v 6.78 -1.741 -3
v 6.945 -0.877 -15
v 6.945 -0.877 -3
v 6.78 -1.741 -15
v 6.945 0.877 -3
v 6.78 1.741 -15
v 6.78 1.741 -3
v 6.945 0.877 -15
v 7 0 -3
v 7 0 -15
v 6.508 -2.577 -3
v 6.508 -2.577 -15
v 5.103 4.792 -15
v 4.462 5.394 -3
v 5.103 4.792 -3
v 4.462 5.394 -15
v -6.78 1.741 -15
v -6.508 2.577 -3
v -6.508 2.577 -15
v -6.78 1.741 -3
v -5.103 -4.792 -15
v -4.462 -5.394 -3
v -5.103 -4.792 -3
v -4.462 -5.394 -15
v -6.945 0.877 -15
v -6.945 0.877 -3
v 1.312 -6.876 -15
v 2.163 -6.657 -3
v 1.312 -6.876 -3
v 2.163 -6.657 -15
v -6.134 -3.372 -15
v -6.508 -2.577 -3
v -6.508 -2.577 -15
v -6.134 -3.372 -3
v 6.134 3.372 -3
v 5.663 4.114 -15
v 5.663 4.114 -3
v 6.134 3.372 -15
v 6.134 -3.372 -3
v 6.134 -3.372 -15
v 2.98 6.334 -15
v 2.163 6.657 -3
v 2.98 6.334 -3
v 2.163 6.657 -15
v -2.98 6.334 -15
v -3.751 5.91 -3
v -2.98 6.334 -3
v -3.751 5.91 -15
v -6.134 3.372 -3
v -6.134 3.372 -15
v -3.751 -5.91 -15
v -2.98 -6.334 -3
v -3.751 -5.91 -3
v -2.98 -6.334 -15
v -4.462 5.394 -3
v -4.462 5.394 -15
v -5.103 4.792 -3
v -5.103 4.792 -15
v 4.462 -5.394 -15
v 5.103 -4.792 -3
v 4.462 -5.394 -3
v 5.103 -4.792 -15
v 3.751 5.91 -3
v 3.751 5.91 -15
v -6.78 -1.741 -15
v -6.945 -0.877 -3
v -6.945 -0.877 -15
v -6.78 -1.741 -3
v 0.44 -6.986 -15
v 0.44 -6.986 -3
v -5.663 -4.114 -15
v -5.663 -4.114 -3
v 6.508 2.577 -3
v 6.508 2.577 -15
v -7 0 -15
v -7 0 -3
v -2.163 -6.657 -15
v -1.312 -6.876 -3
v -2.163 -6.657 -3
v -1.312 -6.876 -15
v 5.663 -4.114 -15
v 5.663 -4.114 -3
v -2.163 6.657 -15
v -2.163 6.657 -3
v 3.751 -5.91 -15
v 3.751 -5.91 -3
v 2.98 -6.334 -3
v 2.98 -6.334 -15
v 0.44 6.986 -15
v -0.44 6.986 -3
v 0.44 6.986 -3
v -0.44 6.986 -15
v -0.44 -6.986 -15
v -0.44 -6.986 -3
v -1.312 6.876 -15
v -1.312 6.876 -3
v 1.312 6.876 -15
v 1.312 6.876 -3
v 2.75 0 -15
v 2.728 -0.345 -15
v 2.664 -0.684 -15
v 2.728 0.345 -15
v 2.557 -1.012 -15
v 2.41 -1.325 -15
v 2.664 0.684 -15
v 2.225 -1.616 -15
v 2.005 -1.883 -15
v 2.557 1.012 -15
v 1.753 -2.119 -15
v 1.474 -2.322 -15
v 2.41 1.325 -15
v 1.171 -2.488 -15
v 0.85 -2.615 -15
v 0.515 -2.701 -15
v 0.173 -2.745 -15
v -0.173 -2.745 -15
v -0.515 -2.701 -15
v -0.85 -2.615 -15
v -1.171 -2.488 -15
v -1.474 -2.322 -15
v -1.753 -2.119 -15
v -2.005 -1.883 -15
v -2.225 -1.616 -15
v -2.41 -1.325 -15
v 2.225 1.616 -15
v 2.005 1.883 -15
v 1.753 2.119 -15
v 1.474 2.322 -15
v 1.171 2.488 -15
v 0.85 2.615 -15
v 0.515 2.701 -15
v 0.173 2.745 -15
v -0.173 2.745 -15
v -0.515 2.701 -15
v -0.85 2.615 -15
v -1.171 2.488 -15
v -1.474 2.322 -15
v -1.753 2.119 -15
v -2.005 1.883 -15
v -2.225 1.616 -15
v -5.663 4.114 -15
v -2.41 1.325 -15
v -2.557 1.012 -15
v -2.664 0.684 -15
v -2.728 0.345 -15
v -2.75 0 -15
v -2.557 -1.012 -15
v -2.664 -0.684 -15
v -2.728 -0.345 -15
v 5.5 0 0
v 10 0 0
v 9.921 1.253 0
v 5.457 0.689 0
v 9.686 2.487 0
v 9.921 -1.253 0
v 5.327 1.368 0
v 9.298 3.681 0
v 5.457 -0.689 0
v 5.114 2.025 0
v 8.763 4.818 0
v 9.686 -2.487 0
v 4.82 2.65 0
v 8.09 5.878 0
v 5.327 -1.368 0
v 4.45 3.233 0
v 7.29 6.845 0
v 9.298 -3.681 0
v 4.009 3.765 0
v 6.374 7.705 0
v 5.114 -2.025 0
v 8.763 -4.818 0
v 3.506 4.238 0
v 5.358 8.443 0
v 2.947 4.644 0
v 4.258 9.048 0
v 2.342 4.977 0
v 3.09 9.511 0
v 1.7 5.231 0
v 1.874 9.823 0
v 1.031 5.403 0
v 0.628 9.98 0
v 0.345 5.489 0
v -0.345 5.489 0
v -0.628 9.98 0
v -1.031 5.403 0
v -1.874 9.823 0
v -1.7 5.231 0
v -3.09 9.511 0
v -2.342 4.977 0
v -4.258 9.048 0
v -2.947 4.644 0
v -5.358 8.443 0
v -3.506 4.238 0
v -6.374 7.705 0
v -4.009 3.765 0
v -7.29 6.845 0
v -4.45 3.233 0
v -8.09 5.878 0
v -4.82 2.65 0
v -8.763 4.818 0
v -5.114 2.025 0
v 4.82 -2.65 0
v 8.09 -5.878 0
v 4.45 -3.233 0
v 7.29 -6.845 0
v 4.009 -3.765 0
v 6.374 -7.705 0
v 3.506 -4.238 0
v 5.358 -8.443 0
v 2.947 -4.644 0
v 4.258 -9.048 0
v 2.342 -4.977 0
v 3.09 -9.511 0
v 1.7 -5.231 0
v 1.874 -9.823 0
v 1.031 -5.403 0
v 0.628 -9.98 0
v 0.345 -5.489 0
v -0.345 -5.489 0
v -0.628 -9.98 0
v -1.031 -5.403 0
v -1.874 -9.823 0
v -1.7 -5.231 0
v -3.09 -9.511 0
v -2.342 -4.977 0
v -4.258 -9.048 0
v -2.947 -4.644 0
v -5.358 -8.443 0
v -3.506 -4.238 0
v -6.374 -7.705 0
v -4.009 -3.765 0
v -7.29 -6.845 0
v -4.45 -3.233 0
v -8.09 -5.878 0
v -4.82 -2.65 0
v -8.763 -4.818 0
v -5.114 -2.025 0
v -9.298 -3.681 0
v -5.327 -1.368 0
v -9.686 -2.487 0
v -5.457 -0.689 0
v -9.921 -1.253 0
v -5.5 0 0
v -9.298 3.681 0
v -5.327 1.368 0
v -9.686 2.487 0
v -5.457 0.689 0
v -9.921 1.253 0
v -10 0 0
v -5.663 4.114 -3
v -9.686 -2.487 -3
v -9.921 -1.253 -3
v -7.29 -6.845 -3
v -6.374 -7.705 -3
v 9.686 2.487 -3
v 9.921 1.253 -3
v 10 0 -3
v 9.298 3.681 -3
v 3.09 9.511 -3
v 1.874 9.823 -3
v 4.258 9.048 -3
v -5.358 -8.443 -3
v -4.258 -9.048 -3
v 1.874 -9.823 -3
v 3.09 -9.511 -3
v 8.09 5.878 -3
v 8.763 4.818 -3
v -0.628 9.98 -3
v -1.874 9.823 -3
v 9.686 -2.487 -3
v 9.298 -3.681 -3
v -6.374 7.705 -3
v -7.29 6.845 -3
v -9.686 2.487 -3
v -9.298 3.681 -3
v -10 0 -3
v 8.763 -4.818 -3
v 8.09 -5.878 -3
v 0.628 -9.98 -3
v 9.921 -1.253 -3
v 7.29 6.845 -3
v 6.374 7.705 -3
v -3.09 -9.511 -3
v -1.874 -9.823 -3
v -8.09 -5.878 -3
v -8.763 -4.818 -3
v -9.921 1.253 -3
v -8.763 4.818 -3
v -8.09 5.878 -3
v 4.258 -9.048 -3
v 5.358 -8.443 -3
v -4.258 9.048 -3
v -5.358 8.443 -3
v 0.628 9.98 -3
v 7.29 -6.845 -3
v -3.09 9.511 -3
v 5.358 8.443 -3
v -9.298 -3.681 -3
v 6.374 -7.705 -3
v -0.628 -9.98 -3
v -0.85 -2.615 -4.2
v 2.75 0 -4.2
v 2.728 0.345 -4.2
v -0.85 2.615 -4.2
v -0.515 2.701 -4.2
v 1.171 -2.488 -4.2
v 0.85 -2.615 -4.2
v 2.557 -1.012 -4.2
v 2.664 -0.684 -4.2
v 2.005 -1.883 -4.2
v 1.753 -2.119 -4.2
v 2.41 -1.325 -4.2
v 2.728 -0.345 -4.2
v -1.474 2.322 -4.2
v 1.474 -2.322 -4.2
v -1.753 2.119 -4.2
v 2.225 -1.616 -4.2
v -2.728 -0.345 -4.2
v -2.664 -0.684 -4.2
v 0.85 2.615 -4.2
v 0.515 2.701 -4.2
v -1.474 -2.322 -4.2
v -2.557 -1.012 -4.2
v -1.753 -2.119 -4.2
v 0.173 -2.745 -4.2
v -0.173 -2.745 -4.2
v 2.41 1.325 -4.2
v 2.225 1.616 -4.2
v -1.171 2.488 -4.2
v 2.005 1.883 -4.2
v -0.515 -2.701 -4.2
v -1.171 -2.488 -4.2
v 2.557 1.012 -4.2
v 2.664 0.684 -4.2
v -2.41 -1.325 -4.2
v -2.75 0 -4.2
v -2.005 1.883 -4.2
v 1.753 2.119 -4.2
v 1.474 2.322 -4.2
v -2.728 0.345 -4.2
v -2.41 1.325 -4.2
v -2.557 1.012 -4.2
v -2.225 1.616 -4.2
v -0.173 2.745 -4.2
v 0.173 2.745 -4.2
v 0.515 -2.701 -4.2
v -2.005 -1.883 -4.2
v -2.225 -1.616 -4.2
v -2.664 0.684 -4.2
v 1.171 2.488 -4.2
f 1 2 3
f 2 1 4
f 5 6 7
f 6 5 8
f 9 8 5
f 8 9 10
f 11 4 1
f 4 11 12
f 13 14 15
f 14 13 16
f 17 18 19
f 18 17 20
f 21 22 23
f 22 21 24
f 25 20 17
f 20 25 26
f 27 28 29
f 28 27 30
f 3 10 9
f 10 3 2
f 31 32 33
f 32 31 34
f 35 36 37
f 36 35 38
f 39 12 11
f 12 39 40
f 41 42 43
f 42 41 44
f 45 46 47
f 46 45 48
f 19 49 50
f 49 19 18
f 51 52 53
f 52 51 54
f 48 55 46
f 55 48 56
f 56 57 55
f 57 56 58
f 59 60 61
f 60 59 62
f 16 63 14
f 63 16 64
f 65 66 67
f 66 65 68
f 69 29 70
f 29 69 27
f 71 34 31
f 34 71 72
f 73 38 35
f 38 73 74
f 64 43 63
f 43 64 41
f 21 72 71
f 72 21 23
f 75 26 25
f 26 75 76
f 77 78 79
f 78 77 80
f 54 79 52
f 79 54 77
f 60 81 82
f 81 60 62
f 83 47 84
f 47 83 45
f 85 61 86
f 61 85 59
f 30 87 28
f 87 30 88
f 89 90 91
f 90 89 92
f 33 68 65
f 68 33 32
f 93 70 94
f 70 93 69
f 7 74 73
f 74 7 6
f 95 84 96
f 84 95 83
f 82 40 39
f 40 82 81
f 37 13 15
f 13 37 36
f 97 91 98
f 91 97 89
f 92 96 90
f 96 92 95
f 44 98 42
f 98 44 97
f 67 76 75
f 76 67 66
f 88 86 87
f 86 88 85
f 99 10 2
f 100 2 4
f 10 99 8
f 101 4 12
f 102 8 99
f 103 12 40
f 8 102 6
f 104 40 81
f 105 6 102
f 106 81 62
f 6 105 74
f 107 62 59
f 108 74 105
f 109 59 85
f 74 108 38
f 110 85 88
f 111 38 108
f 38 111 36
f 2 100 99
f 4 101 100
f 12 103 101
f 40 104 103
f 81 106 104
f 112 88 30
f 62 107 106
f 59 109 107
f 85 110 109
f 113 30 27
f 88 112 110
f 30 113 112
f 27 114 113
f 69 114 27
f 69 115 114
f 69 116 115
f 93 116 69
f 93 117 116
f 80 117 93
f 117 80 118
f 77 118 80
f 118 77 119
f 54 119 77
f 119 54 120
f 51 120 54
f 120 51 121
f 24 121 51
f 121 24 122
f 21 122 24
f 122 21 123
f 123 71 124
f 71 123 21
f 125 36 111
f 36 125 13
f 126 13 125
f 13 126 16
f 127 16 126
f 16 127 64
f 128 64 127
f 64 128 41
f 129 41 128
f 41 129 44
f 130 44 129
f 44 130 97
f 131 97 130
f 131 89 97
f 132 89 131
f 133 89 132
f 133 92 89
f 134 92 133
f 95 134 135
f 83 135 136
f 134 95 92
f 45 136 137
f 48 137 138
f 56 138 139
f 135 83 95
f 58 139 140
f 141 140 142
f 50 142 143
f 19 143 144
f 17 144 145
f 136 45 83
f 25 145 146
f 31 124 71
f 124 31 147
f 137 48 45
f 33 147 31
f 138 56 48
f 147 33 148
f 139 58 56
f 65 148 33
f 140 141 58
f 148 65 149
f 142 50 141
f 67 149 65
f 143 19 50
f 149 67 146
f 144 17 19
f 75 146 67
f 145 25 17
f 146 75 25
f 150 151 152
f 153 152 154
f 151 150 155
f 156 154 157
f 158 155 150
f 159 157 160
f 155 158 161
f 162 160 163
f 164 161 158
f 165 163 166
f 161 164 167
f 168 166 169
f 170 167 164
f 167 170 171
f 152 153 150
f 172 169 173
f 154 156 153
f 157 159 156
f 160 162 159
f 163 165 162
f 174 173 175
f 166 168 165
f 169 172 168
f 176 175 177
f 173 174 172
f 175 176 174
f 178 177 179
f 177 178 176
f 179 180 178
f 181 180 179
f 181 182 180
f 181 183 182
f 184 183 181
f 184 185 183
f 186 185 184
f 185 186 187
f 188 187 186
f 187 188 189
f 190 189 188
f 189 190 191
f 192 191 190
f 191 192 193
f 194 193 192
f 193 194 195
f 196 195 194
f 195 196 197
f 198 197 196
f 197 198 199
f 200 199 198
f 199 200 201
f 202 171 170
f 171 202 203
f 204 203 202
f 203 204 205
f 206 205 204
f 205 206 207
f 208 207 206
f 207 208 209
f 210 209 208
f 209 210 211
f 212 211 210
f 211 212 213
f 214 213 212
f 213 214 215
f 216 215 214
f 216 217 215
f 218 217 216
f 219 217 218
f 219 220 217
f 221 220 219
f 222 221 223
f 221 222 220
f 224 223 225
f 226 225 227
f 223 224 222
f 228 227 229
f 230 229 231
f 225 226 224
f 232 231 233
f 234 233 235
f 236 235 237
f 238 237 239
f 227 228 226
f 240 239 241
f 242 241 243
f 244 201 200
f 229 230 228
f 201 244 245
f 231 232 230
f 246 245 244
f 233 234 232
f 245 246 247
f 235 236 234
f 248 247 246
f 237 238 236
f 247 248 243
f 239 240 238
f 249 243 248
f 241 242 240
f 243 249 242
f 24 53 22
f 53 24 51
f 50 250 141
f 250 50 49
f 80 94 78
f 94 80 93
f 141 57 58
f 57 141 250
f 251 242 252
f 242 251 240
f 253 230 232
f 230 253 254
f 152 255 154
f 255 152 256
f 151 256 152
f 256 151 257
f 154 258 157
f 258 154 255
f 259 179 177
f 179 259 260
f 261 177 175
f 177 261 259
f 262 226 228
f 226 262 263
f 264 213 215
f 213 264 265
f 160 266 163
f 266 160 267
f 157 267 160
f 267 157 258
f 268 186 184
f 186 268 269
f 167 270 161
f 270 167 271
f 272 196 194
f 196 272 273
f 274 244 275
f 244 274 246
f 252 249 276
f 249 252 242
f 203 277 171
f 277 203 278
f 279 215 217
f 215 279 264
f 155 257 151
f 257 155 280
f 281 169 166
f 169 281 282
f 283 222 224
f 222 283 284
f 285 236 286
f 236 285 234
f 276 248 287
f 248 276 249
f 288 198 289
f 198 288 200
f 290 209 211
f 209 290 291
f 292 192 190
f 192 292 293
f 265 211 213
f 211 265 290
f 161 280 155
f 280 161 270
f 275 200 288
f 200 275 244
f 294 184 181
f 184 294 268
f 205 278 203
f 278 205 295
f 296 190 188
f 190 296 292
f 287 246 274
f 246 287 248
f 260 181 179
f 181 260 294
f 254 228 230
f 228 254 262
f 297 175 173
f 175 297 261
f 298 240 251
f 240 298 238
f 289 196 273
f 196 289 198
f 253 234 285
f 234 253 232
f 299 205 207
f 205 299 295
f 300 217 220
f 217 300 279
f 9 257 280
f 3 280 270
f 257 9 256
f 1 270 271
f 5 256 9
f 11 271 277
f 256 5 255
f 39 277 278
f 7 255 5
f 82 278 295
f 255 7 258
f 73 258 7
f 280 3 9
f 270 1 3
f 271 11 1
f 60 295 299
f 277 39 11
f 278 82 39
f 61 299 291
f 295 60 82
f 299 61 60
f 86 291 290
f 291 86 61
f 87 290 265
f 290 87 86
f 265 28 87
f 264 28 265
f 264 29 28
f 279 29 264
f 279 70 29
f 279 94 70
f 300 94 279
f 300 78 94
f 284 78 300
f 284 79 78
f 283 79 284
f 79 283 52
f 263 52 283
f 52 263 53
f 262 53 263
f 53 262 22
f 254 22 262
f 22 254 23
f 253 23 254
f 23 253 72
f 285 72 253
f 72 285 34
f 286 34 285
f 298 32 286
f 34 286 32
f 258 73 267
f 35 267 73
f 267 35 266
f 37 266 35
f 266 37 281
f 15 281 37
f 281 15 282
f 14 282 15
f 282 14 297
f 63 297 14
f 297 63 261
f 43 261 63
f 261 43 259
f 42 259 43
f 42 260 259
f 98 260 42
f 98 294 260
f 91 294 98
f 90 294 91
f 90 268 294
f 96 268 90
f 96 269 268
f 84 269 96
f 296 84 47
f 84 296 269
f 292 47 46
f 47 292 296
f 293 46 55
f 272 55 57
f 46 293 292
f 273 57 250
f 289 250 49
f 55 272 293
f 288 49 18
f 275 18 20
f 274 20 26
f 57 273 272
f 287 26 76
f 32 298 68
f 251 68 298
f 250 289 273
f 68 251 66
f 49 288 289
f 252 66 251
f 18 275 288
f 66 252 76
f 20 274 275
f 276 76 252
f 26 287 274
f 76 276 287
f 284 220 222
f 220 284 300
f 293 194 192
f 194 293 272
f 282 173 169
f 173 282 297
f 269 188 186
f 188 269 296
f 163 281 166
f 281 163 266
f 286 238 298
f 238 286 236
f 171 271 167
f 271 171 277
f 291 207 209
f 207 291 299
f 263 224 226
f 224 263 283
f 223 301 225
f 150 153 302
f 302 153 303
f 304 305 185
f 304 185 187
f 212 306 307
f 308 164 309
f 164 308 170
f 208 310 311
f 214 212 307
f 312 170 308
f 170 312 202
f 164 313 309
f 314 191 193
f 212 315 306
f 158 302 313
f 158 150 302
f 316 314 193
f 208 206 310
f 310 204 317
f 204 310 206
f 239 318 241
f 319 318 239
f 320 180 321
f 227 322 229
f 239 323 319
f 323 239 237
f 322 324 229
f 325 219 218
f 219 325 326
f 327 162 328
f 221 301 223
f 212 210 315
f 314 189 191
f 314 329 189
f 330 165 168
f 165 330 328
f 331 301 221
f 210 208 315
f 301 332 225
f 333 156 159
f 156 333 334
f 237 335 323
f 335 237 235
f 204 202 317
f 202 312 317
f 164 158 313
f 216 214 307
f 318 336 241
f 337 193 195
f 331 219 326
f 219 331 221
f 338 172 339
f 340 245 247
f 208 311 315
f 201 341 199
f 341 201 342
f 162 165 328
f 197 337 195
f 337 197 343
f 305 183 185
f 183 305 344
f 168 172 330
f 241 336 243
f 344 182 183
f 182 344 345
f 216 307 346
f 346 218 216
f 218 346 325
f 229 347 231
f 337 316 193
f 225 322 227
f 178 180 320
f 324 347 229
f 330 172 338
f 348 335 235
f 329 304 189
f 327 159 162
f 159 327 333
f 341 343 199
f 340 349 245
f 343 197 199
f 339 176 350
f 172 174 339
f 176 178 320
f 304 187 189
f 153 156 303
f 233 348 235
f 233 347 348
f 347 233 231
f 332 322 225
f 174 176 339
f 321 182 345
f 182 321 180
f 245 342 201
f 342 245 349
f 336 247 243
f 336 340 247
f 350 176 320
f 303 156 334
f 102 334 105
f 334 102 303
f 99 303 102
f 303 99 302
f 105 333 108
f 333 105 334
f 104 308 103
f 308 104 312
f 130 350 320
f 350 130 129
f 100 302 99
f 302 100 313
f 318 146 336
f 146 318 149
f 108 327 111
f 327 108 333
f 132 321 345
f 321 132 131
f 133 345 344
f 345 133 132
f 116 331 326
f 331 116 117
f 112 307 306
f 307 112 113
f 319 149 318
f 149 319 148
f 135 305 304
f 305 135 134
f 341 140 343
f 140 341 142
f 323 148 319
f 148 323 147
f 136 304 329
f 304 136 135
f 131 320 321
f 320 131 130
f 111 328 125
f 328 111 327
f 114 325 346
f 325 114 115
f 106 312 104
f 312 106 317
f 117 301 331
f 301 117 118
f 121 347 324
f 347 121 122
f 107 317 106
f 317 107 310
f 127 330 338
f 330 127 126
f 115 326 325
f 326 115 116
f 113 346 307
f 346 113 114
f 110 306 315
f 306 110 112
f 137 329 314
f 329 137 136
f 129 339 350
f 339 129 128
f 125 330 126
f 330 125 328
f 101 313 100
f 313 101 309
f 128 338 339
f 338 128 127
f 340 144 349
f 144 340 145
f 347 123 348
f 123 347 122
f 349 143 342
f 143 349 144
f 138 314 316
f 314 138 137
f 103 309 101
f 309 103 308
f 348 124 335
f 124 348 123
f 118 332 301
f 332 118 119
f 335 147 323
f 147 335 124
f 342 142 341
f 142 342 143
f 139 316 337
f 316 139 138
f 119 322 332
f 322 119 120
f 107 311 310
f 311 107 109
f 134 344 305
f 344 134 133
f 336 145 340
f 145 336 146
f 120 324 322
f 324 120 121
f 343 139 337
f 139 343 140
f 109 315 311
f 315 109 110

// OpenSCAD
$fn = 50;


difference() {
	union() {
		translate(v = [0, 0, -15.0000000000]) {
			cylinder(h = 15, r = 7.0000000000);
		}
		translate(v = [0, 0, -3.0000000000]) {
			cylinder(h = 3, r = 10.0000000000);
		}
	}
	union() {
		translate(v = [0, 0, 0]) {
			rotate(a = [0, 0, 0]) {
				difference() {
					union() {
						#translate(v = [0, 0, -15.0000000000]) {
							cylinder(h = 15, r = 2.2500000000);
						}
						#translate(v = [0, 0, -4.2000000000]) {
							cylinder(h = 4.2000000000, r = 7.0000000000, r1 = 2.7500000000, r2 = 5.5000000000);
						}
						#translate(v = [0, 0, -15.0000000000]) {
							cylinder(h = 15, r = 2.7500000000);
						}
						#translate(v = [0, 0, -15.0000000000]) {
							cylinder(h = 15, r = 2.2500000000);
						}
					}
					union();
				}
			}
		}
	}
}
